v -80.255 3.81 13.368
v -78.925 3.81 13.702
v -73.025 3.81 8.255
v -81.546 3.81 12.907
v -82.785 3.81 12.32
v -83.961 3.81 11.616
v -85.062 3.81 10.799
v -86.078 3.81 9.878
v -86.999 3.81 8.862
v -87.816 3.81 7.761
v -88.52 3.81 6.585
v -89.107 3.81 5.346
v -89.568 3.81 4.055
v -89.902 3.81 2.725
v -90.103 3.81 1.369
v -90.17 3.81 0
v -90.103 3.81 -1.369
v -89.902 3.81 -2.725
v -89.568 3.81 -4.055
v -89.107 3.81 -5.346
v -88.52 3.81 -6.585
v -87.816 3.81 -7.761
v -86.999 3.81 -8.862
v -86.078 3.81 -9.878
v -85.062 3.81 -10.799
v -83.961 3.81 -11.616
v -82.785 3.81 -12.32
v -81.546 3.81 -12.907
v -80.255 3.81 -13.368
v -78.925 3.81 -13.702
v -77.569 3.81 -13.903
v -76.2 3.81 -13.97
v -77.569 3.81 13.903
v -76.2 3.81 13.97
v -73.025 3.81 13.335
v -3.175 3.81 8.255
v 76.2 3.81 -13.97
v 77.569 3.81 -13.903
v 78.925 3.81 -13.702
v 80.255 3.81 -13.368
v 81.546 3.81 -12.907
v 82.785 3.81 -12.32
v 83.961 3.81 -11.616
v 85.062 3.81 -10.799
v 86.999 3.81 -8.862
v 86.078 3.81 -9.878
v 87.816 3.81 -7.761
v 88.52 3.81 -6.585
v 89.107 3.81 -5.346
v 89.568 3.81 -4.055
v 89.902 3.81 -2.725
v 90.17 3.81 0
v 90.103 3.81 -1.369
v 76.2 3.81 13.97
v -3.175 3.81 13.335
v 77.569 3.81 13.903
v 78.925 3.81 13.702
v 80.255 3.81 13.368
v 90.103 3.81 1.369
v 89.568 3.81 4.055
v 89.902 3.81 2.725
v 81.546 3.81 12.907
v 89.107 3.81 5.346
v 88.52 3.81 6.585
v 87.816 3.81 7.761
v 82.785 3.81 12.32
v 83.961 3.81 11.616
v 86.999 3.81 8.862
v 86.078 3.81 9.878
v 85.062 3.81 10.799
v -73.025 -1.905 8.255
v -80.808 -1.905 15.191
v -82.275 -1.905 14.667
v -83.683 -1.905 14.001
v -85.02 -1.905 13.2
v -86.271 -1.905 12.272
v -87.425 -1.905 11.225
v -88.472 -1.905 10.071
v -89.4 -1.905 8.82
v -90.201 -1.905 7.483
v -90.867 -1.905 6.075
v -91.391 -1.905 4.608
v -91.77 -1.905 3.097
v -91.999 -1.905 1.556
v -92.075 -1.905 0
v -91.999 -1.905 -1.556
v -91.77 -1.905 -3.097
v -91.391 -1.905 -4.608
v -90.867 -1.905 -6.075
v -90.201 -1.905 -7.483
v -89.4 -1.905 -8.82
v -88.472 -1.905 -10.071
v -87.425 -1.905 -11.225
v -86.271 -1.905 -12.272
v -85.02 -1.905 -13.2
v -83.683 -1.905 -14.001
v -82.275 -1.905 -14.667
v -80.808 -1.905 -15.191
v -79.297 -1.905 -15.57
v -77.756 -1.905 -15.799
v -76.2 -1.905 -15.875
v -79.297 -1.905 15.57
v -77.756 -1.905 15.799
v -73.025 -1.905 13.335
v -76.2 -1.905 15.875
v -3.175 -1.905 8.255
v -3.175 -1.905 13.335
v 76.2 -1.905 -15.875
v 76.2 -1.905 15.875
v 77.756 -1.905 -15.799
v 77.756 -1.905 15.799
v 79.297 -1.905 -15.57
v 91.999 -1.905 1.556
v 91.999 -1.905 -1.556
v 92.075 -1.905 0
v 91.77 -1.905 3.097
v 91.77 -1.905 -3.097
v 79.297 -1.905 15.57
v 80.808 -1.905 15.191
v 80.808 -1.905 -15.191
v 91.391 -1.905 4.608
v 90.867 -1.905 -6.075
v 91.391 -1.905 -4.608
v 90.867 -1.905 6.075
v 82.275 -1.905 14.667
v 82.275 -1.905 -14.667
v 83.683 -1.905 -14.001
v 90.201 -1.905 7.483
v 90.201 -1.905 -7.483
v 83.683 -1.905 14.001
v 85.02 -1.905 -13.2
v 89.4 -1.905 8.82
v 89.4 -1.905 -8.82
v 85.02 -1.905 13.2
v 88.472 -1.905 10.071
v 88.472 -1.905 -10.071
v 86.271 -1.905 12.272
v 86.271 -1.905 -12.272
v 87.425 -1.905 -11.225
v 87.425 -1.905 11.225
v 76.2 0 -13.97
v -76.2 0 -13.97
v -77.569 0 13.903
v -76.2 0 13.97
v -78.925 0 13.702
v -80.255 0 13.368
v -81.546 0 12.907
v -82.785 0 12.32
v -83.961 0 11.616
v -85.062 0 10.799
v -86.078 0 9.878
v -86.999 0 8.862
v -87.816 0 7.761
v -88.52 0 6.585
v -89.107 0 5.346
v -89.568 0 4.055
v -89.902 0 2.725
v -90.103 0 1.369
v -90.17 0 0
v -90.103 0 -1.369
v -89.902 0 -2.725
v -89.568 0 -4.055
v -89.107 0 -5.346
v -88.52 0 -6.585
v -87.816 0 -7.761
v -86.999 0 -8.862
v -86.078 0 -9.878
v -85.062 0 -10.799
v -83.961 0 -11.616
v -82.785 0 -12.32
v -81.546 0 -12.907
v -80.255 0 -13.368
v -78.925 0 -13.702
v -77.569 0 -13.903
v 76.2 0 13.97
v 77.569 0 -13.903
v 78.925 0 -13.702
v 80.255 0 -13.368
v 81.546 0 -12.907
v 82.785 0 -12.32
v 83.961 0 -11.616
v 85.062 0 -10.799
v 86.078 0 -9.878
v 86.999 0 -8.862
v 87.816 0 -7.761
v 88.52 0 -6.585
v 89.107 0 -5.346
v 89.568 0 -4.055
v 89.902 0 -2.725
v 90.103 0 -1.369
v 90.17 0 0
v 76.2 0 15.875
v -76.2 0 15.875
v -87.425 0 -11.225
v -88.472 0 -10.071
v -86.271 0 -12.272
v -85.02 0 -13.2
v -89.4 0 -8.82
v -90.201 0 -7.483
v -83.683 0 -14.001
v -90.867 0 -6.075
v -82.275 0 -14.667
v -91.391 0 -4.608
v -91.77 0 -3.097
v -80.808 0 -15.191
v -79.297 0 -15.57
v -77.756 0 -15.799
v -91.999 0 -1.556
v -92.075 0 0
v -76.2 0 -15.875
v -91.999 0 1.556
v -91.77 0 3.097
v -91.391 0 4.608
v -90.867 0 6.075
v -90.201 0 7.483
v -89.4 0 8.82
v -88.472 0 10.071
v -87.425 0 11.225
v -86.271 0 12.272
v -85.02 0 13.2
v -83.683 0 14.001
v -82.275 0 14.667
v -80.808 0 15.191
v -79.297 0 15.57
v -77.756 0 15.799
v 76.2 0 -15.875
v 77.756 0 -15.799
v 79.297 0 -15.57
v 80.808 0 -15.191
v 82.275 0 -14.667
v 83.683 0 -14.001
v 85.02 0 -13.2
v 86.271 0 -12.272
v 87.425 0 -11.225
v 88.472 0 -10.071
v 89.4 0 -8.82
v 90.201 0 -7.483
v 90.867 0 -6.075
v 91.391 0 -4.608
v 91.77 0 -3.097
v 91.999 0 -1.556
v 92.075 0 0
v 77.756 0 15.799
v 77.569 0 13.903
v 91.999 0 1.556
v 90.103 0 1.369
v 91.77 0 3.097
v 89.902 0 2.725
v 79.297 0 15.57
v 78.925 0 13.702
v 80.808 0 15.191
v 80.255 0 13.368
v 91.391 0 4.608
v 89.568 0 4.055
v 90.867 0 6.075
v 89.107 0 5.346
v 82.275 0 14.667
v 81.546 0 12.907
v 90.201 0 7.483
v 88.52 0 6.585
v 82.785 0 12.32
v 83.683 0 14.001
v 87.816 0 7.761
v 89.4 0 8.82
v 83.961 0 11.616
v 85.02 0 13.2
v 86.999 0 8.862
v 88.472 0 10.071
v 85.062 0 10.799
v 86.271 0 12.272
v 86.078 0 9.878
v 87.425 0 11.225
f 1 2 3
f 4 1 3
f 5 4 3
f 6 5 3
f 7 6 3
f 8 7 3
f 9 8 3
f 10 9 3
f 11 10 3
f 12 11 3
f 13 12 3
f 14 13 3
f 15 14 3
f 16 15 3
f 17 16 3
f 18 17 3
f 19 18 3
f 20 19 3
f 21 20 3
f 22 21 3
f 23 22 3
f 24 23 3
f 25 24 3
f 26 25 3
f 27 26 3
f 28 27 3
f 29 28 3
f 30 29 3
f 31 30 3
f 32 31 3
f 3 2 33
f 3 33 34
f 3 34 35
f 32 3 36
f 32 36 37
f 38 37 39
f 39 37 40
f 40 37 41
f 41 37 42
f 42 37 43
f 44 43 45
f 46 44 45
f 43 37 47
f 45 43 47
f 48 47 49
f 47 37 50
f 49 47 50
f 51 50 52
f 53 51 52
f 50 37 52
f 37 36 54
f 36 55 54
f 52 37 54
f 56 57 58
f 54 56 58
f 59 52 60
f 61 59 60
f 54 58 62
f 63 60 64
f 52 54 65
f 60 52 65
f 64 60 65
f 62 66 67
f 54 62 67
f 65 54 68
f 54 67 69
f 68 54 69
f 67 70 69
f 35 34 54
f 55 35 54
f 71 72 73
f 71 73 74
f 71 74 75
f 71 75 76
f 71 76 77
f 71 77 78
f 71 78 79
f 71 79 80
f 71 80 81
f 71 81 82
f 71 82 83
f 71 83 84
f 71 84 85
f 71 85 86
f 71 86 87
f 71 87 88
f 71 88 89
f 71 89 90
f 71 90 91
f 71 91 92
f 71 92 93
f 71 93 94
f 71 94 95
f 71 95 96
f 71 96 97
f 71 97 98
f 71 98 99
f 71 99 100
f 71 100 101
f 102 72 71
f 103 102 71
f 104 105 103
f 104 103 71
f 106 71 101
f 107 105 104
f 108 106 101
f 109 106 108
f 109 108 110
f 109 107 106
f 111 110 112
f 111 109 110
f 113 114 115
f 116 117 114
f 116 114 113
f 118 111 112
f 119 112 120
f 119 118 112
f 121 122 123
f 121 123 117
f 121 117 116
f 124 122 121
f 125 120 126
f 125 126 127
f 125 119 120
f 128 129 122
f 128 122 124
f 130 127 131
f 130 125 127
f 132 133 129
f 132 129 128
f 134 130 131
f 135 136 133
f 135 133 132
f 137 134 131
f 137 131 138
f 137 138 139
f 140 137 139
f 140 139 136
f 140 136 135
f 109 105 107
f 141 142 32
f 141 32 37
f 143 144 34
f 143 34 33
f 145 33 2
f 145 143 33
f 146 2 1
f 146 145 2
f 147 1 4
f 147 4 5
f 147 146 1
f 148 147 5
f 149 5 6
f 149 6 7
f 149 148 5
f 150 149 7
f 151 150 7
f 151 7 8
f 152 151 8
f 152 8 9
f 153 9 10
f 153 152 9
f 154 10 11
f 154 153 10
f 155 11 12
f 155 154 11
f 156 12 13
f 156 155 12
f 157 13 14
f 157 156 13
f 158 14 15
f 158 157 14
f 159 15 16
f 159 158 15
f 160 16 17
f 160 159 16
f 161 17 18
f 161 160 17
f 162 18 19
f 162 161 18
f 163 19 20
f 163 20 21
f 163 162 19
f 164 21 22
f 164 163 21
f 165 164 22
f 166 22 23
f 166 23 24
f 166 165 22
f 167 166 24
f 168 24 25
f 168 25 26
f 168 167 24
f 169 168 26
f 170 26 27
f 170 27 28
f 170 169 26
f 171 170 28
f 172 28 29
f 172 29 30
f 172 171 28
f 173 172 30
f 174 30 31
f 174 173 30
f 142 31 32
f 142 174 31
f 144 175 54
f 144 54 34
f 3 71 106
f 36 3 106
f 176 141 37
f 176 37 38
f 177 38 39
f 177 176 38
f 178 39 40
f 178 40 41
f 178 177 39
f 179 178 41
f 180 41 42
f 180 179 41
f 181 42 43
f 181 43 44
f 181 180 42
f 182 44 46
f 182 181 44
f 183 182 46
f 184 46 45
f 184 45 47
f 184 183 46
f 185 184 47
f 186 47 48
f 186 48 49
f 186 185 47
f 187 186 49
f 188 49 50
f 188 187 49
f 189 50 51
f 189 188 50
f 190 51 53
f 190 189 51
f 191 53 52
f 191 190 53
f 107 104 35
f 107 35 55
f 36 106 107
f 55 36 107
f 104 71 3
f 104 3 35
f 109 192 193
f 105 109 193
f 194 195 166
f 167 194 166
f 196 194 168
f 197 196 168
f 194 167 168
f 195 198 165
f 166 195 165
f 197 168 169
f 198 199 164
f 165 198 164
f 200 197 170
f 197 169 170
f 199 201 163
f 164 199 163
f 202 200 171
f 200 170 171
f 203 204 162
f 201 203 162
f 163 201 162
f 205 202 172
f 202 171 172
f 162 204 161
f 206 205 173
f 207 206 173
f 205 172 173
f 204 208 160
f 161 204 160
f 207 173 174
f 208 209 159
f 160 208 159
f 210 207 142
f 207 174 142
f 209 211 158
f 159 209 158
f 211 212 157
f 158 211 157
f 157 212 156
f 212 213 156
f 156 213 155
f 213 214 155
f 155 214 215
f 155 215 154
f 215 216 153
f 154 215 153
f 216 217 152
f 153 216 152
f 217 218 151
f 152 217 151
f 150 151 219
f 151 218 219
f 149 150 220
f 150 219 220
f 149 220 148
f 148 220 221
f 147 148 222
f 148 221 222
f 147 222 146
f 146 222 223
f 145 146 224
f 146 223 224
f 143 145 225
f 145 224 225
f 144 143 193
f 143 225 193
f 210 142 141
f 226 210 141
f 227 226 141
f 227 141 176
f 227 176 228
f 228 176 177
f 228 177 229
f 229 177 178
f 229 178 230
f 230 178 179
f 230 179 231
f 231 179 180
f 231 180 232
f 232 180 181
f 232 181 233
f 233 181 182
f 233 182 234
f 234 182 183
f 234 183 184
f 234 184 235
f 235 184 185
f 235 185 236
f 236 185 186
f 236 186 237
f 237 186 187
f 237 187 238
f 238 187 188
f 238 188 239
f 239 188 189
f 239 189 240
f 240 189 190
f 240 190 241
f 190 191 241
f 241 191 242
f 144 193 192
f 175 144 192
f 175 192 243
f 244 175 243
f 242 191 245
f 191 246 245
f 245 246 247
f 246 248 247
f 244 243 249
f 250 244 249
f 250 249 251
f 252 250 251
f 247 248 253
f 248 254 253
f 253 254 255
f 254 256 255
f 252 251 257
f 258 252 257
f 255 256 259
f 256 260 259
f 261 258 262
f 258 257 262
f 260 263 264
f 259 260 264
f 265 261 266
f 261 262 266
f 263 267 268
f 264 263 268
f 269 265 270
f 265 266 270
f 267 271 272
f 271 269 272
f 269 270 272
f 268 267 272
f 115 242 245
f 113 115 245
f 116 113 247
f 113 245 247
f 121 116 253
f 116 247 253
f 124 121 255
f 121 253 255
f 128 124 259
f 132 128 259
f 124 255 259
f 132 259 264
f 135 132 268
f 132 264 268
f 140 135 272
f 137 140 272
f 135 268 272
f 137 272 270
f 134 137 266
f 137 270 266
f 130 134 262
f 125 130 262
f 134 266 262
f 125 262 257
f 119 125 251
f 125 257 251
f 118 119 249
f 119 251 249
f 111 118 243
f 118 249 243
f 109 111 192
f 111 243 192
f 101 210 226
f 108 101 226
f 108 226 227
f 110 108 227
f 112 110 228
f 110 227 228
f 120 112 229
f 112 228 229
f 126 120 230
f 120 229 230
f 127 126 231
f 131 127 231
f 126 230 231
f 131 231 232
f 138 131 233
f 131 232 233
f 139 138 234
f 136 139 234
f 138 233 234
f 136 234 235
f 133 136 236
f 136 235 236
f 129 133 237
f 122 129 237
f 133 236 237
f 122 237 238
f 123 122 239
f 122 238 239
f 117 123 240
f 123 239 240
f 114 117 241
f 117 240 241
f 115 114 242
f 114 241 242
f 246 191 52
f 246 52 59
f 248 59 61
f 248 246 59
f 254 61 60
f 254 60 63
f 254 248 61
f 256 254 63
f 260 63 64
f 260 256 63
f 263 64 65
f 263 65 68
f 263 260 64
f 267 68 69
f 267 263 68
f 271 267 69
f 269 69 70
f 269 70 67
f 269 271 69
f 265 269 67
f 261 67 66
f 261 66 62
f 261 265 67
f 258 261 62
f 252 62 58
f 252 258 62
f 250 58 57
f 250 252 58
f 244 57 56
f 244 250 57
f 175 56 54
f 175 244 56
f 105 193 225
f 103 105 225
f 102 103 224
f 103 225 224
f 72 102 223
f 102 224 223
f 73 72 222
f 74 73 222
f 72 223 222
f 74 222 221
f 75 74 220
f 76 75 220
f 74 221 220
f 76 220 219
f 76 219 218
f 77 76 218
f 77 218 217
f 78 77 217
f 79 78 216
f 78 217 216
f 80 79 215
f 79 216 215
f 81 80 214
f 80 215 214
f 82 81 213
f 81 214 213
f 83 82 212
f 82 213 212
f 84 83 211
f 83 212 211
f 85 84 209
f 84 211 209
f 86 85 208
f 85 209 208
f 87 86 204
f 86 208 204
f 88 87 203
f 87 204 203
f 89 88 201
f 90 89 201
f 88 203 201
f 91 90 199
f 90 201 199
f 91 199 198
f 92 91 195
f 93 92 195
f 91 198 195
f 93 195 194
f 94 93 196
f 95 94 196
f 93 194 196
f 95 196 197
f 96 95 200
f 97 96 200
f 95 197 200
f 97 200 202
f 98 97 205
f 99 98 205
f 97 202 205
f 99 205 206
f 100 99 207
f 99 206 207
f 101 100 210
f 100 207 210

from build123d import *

# Parameters (mm, degrees)
F2_DEPTH = 1.905
F3_DEPTH = 3.81
F4_W     = 69.85
F4_H     = 5.08
F5_DEPTH = 5.716


with BuildPart() as f2:
    # F0 (on Front) → F2 (new body)
    with BuildSketch(Plane.XZ):
        with BuildLine():
            Line((-76.2, 15.875), (-76.2, 0))
            Line((-76.2, 0), (-60.325, 0))
            ThreePointArc((-60.325, 0), (-64.9746798487, 11.2253201513), (-76.2, 15.875))
        make_face()
        with BuildLine():
            Line((-60.325, 0), (-76.2, 0))
            Line((-76.2, 0), (-76.2, -15.875))
            ThreePointArc((-76.2, -15.875), (-64.9746798487, -11.2253201513), (-60.325, 0))
        make_face()
        with BuildLine():
            Line((-76.2, -15.875), (-76.2, 0))
            Line((-76.2, 0), (-76.2, 15.875))
            ThreePointArc((-76.2, 15.875), (-92.075, 0), (-76.2, -15.875))
        make_face()
        with BuildLine():
            ThreePointArc((-76.2, 15.875), (-64.9746798487, 11.2253201513), (-60.325, 0))
            Line((-60.325, 0), (60.325, 0))
            ThreePointArc((60.325, 0), (64.9746798487, 11.2253201513), (76.2, 15.875))
            Line((76.2, 15.875), (-76.2, 15.875))
        make_face()
        with BuildLine():
            Line((60.325, 0), (-60.325, 0))
            ThreePointArc((-60.325, 0), (-64.9746798487, -11.2253201513), (-76.2, -15.875))
            Line((-76.2, -15.875), (76.2, -15.875))
            ThreePointArc((76.2, -15.875), (64.9746798487, -11.2253201513), (60.325, 0))
        make_face()
        with BuildLine():
            ThreePointArc((76.2, 15.875), (64.9746798487, 11.2253201513), (60.325, 0))
            Line((60.325, 0), (76.2, 0))
            Line((76.2, 0), (76.2, 15.875))
        make_face()
        with BuildLine():
            Line((76.2, 0), (60.325, 0))
            ThreePointArc((60.325, 0), (64.9746798487, -11.2253201513), (76.2, -15.875))
            Line((76.2, -15.875), (76.2, 0))
        make_face()
        with BuildLine():
            Line((76.2, 0), (76.2, -15.875))
            ThreePointArc((76.2, -15.875), (87.4253201513, -11.2253201513), (92.075, 0))
            ThreePointArc((92.075, 0), (87.4253201513, 11.2253201513), (76.2, 15.875))
            Line((76.2, 15.875), (76.2, 0))
        make_face()
    extrude(amount=F2_DEPTH)

    # F1 (on Front) → F3 (join)
    with BuildSketch(Plane.XZ):
        with BuildLine():
            ThreePointArc((76.2, -13.97), (62.23, 0), (76.2, 13.97))
            Line((76.2, 13.97), (-76.2, 13.97))
            ThreePointArc((-76.2, 13.97), (-66.3217182668, 9.8782817332), (-62.23, 0))
            ThreePointArc((-62.23, 0), (-66.3217182668, -9.8782817332), (-76.2, -13.97))
            Line((-76.2, -13.97), (76.2, -13.97))
        make_face()
        with BuildLine():
            ThreePointArc((90.17, 0), (86.0782817332, 9.8782817332), (76.2, 13.97))
            Line((76.2, 13.97), (76.2, -13.97))
            ThreePointArc((76.2, -13.97), (86.0782817332, -9.8782817332), (90.17, 0))
        make_face()
        with BuildLine():
            Line((76.2, -13.97), (76.2, 13.97))
            ThreePointArc((76.2, 13.97), (62.23, 0), (76.2, -13.97))
        make_face()
        with BuildLine():
            ThreePointArc((-62.23, 0), (-66.3217182668, 9.8782817332), (-76.2, 13.97))
            Line((-76.2, 13.97), (-76.2, -13.97))
            ThreePointArc((-76.2, -13.97), (-66.3217182668, -9.8782817332), (-62.23, 0))
        make_face()
        with BuildLine():
            Line((-76.2, -13.97), (-76.2, 13.97))
            ThreePointArc((-76.2, 13.97), (-90.17, 0), (-76.2, -13.97))
        make_face()
    extrude(amount=-F3_DEPTH)

    # F4 (on face) → F5 (cut, through all)
    with BuildSketch(Plane.XZ.offset(1.905)):
        with Locations((-38.1, 10.795)):
            Rectangle(F4_W, F4_H)
    extrude(amount=-F5_DEPTH, mode=Mode.SUBTRACT)


solid = f2.part
